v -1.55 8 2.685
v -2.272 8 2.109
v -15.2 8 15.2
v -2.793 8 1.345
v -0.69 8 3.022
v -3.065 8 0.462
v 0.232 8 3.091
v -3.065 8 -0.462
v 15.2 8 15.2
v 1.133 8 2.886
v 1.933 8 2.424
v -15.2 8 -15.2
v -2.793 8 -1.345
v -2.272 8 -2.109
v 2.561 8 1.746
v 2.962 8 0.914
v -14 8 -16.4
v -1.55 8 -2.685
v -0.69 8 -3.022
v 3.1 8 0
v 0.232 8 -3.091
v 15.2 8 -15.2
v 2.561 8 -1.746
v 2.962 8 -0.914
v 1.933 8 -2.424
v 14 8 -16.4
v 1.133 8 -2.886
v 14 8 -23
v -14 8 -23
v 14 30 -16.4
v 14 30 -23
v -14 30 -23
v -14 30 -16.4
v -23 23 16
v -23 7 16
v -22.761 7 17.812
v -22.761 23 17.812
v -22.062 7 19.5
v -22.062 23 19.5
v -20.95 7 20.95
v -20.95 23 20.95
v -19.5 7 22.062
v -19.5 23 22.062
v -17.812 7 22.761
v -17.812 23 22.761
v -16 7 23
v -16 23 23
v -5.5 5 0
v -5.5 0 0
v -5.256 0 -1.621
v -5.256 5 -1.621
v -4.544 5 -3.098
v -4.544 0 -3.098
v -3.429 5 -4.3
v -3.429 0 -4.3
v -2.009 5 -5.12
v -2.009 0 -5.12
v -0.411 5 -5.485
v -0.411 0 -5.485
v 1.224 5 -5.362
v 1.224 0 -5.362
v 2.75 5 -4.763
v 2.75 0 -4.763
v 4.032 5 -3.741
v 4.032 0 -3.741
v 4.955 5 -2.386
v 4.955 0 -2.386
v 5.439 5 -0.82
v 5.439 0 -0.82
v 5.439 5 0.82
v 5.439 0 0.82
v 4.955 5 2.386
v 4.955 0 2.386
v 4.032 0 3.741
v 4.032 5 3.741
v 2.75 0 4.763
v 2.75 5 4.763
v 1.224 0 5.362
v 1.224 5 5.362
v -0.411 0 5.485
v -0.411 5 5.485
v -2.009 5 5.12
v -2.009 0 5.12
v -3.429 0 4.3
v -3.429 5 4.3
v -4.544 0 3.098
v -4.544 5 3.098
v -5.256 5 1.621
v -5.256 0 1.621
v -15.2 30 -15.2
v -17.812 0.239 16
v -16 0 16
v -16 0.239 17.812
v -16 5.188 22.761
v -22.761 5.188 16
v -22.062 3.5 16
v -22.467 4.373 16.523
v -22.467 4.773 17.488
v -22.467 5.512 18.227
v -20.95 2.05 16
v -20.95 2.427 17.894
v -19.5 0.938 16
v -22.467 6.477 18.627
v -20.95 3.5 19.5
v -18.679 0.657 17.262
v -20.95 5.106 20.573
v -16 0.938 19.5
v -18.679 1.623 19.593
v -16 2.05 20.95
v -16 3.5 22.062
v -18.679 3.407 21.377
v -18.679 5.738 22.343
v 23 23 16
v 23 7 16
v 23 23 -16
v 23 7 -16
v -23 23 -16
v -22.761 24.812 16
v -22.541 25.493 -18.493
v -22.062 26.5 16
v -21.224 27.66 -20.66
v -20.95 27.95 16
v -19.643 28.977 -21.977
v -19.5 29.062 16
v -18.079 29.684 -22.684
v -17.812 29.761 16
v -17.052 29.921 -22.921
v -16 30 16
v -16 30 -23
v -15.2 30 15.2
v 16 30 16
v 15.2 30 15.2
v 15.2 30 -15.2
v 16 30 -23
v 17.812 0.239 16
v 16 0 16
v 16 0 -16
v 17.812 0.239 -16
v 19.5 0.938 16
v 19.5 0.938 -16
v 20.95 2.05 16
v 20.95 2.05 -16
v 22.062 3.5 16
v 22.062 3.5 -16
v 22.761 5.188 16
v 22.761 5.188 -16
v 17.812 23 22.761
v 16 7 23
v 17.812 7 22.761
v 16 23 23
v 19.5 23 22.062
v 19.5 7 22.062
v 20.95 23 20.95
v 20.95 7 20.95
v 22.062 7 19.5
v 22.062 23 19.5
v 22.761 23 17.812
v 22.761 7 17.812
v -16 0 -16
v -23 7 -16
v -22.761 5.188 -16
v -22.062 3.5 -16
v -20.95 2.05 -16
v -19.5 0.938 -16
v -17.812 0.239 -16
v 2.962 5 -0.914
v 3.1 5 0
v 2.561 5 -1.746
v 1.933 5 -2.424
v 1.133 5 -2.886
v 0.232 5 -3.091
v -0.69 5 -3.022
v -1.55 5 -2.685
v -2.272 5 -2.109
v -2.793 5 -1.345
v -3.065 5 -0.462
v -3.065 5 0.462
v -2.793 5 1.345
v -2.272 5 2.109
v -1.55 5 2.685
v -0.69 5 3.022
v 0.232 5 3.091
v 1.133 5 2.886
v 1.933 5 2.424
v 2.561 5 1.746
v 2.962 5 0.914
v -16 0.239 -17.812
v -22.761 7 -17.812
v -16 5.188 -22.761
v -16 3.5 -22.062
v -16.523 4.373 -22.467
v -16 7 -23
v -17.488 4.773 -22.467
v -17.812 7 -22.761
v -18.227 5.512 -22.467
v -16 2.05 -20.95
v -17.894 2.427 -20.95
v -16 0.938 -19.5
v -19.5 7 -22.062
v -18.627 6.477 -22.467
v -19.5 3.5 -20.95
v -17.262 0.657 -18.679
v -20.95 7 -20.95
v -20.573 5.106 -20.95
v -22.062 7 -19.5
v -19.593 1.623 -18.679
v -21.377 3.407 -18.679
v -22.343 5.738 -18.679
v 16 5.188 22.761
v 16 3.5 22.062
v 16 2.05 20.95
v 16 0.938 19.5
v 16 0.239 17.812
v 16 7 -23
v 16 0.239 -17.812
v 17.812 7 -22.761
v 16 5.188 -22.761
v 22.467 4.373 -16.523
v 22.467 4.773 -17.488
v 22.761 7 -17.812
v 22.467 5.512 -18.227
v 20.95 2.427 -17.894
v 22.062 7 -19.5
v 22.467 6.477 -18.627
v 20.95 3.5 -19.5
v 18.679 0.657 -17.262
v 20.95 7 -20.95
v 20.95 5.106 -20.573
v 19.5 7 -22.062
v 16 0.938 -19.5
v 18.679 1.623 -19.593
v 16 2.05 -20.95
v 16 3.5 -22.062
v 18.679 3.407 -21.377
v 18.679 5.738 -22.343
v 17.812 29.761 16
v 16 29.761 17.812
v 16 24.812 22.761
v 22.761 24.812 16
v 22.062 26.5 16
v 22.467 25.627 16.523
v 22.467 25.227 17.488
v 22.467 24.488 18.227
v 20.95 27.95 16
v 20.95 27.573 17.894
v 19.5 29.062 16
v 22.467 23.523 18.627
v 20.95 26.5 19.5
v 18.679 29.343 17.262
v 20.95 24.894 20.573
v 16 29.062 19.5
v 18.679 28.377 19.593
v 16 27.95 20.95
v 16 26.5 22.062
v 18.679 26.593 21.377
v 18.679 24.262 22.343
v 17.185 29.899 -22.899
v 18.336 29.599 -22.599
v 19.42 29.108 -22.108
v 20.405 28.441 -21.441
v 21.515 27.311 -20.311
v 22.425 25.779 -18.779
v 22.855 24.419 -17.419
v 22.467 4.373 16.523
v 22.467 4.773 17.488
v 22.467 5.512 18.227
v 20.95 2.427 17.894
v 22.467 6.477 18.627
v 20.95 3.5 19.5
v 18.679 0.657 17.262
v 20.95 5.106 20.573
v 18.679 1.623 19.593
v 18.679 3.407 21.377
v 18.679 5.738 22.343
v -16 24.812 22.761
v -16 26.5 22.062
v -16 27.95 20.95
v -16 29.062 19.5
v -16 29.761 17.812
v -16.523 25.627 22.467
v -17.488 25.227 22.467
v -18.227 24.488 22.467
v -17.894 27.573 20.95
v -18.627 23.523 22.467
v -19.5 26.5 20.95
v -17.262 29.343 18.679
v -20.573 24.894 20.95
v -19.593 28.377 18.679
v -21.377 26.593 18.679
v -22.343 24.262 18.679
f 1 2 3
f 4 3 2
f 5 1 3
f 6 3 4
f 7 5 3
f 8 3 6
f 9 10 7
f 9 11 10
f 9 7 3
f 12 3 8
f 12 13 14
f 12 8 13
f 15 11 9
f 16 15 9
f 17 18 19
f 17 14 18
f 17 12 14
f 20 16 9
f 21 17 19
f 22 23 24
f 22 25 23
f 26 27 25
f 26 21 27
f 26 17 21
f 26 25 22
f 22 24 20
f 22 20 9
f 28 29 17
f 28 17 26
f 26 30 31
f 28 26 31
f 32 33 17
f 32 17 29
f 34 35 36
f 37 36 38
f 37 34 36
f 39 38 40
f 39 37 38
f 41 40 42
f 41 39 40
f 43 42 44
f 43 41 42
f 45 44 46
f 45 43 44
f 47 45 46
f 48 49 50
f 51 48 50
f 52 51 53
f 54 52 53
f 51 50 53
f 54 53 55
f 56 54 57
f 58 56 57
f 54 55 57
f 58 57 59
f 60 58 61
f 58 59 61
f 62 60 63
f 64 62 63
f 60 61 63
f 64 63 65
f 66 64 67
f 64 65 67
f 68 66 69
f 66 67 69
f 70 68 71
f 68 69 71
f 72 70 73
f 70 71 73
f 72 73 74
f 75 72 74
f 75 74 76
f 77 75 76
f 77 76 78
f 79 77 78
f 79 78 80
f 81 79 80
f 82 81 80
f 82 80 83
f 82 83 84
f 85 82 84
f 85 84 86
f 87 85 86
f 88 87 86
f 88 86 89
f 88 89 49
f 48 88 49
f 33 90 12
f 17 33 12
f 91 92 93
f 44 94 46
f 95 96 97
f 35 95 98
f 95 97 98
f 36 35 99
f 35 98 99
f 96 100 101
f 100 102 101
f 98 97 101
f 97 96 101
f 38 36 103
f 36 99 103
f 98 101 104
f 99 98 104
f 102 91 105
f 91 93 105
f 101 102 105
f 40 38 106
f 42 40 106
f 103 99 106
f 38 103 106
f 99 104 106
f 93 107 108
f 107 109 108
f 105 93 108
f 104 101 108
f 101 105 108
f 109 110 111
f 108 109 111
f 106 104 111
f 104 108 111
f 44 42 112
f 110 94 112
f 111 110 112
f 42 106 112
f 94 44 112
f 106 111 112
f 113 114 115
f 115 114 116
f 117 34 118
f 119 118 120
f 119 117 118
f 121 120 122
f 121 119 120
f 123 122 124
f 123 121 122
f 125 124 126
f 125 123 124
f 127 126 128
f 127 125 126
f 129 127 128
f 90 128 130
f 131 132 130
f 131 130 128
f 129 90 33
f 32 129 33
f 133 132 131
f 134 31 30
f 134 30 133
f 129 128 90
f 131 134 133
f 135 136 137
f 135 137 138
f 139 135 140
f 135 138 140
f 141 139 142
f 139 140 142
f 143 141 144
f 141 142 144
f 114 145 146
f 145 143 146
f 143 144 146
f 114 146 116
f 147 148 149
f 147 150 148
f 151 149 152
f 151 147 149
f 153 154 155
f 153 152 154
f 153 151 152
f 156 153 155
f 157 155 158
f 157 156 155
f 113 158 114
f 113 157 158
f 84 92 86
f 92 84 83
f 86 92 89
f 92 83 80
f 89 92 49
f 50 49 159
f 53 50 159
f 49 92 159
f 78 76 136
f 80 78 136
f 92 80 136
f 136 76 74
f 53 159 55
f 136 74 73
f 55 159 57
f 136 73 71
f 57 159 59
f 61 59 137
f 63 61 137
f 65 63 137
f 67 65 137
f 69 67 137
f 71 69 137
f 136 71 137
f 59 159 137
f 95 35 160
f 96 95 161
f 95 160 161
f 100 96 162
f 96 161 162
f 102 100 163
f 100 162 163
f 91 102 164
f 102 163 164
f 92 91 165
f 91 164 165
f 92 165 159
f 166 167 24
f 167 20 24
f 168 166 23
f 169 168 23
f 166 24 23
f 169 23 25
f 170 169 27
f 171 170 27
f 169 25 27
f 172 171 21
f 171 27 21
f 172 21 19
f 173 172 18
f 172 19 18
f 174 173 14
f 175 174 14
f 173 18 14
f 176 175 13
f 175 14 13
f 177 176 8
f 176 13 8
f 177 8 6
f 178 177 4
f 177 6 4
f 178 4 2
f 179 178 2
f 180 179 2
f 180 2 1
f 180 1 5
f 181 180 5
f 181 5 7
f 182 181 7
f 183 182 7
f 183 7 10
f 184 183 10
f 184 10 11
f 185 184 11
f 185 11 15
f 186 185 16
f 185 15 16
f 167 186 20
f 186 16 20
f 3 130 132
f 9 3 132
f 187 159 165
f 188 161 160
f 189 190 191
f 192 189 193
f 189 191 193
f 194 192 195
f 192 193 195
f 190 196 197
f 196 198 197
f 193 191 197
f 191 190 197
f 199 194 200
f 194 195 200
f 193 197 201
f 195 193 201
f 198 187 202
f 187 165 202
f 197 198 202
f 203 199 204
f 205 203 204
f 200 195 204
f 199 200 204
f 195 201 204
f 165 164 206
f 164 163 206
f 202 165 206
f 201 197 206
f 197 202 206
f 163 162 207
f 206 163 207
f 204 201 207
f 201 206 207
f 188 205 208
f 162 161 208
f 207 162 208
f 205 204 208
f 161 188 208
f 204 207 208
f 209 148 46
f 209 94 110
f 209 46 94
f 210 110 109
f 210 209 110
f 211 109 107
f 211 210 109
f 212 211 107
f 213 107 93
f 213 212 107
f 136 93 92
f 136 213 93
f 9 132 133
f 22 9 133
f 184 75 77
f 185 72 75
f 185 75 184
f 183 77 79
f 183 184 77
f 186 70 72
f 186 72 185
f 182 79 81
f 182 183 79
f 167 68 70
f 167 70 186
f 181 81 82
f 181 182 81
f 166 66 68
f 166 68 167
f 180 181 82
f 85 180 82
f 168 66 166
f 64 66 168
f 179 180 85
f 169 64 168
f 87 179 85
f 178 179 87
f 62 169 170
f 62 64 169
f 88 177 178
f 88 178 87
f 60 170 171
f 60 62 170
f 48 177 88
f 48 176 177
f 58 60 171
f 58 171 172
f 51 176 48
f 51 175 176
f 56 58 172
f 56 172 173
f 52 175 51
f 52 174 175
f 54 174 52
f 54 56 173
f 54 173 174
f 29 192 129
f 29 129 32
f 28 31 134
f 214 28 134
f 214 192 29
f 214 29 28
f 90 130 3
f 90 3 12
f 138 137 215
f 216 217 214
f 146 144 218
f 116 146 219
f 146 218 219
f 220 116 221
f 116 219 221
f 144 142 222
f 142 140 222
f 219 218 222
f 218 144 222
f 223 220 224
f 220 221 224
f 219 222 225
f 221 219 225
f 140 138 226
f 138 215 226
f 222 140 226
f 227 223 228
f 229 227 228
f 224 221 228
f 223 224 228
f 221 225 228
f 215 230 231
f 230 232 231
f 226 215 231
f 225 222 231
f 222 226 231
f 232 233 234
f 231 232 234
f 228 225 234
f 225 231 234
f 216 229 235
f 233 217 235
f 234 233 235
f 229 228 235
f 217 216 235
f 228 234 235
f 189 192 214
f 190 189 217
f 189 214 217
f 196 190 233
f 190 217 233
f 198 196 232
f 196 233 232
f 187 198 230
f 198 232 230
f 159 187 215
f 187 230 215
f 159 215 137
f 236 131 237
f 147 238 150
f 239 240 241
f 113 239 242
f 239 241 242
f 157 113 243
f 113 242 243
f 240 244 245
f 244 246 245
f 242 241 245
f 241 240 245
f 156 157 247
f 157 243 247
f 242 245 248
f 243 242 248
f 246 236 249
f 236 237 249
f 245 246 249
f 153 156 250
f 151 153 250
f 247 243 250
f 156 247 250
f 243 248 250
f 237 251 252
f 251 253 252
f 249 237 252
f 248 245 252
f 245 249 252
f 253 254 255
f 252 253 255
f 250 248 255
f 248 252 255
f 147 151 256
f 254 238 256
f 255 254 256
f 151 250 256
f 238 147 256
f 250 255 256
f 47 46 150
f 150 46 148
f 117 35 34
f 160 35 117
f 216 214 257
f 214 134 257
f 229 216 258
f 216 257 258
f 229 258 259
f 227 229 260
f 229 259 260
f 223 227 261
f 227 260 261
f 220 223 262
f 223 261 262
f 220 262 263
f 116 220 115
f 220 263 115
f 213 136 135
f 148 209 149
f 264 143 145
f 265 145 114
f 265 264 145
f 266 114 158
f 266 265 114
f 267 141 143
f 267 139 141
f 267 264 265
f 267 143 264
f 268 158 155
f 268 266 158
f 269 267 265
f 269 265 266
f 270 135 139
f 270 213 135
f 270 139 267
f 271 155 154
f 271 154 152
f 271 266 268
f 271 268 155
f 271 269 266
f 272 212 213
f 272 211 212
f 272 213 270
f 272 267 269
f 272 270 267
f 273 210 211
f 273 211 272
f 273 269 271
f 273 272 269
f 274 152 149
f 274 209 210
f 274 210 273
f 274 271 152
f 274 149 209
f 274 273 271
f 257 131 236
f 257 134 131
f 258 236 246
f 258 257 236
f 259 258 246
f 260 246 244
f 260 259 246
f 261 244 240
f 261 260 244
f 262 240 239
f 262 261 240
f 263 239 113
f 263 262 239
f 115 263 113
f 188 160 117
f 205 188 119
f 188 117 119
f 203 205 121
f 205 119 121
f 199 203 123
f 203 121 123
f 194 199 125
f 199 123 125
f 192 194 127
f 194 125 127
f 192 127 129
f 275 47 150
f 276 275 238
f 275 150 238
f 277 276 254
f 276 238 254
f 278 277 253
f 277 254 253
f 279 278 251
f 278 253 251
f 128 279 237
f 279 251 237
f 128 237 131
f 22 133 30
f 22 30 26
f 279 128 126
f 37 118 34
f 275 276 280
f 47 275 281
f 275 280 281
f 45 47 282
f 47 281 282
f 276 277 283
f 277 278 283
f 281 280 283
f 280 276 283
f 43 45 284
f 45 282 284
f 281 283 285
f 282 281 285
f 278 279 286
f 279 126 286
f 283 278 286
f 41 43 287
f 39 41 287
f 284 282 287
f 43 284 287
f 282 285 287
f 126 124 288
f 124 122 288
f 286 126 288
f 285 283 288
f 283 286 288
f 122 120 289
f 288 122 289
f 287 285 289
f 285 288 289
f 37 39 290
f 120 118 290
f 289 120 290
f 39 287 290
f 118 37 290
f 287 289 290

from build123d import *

# Parameters (mm, degrees)
SKETCH_1_W                   = 46
SKETCH_1_H                   = 46
EXTRUDE_1_DEPTH              = 30
SKETCH_2_W                   = 30.4
SKETCH_2_H                   = 30.4
CUT_EXTRUDE_1_DEPTH          = 22
SKETCH_3_W                   = 28
SKETCH_3_H                   = 7.8
CUT_EXTRUDE_2_DEPTH          = 22
FILLET_1_R                   = 7
HOLE_WIZARD_M6_1_D           = 6.2
HOLE_WIZARD_M6_1_CBORE_D     = 11
HOLE_WIZARD_M6_1_CBORE_DEPTH = 5
CHAMFER_1_SIZE               = 1.2


with BuildPart() as part:
    # 草图1 → 凸台-拉伸1 (new body)
    with BuildSketch(Plane(origin=(0, 0, 0), x_dir=(1, 0, 0), z_dir=(0, 1, 0))):
        Rectangle(SKETCH_1_W, SKETCH_1_H)
    extrude(amount=EXTRUDE_1_DEPTH)

    # 草图2 → 切除-拉伸1 (cut)
    with BuildSketch(Plane(origin=(0, 30, 0), x_dir=(1, 0, 0), z_dir=(0, 1, 0))):
        Rectangle(SKETCH_2_W, SKETCH_2_H)
    extrude(amount=-CUT_EXTRUDE_1_DEPTH, mode=Mode.SUBTRACT)

    # 草图3 → 切除-拉伸2 (cut)
    with BuildSketch(Plane(origin=(0, 30, 0), x_dir=(1, 0, 0), z_dir=(0, 1, 0))):
        with Locations((0, 19.1)):
            Rectangle(SKETCH_3_W, SKETCH_3_H)
    extrude(amount=-CUT_EXTRUDE_2_DEPTH, mode=Mode.SUBTRACT)

    # 圆角1
    fillet_1_edges = [part.edges().sort_by_distance(p)[0] for p in [
        (-23, 30, 0),
        (0, 30, 23),
        (23, 30, 0),
        (0, 0, 23),
        (-23, 0, 0),
        (0, 0, -23),
        (23, 0, 0),
        (23, 15, 23),
        (-23, 15, 23),
        (-23, 15, -23),
        (23, 15, -23),
    ]]
    fillet(fillet_1_edges, radius=FILLET_1_R)

    # M6 六角头螺钉的柱形沉头孔1 (through all)
    with Locations(Plane(origin=(0, 0, 0), x_dir=(-1, 0, 0), z_dir=(0, -1, 0))):
        with Locations((0, 0)):
            CounterBoreHole(HOLE_WIZARD_M6_1_D / 2, HOLE_WIZARD_M6_1_CBORE_D / 2, HOLE_WIZARD_M6_1_CBORE_DEPTH)

    # 倒角1
    chamfer_1_edges = [part.edges().sort_by_distance(p)[0] for p in [
        (14, 19, -15.2),
        (-14, 19, -15.2),
    ]]
    chamfer(chamfer_1_edges, length=CHAMFER_1_SIZE - 0.0001)  # a hair under: the kernel refuses the full size


solid = part.part
